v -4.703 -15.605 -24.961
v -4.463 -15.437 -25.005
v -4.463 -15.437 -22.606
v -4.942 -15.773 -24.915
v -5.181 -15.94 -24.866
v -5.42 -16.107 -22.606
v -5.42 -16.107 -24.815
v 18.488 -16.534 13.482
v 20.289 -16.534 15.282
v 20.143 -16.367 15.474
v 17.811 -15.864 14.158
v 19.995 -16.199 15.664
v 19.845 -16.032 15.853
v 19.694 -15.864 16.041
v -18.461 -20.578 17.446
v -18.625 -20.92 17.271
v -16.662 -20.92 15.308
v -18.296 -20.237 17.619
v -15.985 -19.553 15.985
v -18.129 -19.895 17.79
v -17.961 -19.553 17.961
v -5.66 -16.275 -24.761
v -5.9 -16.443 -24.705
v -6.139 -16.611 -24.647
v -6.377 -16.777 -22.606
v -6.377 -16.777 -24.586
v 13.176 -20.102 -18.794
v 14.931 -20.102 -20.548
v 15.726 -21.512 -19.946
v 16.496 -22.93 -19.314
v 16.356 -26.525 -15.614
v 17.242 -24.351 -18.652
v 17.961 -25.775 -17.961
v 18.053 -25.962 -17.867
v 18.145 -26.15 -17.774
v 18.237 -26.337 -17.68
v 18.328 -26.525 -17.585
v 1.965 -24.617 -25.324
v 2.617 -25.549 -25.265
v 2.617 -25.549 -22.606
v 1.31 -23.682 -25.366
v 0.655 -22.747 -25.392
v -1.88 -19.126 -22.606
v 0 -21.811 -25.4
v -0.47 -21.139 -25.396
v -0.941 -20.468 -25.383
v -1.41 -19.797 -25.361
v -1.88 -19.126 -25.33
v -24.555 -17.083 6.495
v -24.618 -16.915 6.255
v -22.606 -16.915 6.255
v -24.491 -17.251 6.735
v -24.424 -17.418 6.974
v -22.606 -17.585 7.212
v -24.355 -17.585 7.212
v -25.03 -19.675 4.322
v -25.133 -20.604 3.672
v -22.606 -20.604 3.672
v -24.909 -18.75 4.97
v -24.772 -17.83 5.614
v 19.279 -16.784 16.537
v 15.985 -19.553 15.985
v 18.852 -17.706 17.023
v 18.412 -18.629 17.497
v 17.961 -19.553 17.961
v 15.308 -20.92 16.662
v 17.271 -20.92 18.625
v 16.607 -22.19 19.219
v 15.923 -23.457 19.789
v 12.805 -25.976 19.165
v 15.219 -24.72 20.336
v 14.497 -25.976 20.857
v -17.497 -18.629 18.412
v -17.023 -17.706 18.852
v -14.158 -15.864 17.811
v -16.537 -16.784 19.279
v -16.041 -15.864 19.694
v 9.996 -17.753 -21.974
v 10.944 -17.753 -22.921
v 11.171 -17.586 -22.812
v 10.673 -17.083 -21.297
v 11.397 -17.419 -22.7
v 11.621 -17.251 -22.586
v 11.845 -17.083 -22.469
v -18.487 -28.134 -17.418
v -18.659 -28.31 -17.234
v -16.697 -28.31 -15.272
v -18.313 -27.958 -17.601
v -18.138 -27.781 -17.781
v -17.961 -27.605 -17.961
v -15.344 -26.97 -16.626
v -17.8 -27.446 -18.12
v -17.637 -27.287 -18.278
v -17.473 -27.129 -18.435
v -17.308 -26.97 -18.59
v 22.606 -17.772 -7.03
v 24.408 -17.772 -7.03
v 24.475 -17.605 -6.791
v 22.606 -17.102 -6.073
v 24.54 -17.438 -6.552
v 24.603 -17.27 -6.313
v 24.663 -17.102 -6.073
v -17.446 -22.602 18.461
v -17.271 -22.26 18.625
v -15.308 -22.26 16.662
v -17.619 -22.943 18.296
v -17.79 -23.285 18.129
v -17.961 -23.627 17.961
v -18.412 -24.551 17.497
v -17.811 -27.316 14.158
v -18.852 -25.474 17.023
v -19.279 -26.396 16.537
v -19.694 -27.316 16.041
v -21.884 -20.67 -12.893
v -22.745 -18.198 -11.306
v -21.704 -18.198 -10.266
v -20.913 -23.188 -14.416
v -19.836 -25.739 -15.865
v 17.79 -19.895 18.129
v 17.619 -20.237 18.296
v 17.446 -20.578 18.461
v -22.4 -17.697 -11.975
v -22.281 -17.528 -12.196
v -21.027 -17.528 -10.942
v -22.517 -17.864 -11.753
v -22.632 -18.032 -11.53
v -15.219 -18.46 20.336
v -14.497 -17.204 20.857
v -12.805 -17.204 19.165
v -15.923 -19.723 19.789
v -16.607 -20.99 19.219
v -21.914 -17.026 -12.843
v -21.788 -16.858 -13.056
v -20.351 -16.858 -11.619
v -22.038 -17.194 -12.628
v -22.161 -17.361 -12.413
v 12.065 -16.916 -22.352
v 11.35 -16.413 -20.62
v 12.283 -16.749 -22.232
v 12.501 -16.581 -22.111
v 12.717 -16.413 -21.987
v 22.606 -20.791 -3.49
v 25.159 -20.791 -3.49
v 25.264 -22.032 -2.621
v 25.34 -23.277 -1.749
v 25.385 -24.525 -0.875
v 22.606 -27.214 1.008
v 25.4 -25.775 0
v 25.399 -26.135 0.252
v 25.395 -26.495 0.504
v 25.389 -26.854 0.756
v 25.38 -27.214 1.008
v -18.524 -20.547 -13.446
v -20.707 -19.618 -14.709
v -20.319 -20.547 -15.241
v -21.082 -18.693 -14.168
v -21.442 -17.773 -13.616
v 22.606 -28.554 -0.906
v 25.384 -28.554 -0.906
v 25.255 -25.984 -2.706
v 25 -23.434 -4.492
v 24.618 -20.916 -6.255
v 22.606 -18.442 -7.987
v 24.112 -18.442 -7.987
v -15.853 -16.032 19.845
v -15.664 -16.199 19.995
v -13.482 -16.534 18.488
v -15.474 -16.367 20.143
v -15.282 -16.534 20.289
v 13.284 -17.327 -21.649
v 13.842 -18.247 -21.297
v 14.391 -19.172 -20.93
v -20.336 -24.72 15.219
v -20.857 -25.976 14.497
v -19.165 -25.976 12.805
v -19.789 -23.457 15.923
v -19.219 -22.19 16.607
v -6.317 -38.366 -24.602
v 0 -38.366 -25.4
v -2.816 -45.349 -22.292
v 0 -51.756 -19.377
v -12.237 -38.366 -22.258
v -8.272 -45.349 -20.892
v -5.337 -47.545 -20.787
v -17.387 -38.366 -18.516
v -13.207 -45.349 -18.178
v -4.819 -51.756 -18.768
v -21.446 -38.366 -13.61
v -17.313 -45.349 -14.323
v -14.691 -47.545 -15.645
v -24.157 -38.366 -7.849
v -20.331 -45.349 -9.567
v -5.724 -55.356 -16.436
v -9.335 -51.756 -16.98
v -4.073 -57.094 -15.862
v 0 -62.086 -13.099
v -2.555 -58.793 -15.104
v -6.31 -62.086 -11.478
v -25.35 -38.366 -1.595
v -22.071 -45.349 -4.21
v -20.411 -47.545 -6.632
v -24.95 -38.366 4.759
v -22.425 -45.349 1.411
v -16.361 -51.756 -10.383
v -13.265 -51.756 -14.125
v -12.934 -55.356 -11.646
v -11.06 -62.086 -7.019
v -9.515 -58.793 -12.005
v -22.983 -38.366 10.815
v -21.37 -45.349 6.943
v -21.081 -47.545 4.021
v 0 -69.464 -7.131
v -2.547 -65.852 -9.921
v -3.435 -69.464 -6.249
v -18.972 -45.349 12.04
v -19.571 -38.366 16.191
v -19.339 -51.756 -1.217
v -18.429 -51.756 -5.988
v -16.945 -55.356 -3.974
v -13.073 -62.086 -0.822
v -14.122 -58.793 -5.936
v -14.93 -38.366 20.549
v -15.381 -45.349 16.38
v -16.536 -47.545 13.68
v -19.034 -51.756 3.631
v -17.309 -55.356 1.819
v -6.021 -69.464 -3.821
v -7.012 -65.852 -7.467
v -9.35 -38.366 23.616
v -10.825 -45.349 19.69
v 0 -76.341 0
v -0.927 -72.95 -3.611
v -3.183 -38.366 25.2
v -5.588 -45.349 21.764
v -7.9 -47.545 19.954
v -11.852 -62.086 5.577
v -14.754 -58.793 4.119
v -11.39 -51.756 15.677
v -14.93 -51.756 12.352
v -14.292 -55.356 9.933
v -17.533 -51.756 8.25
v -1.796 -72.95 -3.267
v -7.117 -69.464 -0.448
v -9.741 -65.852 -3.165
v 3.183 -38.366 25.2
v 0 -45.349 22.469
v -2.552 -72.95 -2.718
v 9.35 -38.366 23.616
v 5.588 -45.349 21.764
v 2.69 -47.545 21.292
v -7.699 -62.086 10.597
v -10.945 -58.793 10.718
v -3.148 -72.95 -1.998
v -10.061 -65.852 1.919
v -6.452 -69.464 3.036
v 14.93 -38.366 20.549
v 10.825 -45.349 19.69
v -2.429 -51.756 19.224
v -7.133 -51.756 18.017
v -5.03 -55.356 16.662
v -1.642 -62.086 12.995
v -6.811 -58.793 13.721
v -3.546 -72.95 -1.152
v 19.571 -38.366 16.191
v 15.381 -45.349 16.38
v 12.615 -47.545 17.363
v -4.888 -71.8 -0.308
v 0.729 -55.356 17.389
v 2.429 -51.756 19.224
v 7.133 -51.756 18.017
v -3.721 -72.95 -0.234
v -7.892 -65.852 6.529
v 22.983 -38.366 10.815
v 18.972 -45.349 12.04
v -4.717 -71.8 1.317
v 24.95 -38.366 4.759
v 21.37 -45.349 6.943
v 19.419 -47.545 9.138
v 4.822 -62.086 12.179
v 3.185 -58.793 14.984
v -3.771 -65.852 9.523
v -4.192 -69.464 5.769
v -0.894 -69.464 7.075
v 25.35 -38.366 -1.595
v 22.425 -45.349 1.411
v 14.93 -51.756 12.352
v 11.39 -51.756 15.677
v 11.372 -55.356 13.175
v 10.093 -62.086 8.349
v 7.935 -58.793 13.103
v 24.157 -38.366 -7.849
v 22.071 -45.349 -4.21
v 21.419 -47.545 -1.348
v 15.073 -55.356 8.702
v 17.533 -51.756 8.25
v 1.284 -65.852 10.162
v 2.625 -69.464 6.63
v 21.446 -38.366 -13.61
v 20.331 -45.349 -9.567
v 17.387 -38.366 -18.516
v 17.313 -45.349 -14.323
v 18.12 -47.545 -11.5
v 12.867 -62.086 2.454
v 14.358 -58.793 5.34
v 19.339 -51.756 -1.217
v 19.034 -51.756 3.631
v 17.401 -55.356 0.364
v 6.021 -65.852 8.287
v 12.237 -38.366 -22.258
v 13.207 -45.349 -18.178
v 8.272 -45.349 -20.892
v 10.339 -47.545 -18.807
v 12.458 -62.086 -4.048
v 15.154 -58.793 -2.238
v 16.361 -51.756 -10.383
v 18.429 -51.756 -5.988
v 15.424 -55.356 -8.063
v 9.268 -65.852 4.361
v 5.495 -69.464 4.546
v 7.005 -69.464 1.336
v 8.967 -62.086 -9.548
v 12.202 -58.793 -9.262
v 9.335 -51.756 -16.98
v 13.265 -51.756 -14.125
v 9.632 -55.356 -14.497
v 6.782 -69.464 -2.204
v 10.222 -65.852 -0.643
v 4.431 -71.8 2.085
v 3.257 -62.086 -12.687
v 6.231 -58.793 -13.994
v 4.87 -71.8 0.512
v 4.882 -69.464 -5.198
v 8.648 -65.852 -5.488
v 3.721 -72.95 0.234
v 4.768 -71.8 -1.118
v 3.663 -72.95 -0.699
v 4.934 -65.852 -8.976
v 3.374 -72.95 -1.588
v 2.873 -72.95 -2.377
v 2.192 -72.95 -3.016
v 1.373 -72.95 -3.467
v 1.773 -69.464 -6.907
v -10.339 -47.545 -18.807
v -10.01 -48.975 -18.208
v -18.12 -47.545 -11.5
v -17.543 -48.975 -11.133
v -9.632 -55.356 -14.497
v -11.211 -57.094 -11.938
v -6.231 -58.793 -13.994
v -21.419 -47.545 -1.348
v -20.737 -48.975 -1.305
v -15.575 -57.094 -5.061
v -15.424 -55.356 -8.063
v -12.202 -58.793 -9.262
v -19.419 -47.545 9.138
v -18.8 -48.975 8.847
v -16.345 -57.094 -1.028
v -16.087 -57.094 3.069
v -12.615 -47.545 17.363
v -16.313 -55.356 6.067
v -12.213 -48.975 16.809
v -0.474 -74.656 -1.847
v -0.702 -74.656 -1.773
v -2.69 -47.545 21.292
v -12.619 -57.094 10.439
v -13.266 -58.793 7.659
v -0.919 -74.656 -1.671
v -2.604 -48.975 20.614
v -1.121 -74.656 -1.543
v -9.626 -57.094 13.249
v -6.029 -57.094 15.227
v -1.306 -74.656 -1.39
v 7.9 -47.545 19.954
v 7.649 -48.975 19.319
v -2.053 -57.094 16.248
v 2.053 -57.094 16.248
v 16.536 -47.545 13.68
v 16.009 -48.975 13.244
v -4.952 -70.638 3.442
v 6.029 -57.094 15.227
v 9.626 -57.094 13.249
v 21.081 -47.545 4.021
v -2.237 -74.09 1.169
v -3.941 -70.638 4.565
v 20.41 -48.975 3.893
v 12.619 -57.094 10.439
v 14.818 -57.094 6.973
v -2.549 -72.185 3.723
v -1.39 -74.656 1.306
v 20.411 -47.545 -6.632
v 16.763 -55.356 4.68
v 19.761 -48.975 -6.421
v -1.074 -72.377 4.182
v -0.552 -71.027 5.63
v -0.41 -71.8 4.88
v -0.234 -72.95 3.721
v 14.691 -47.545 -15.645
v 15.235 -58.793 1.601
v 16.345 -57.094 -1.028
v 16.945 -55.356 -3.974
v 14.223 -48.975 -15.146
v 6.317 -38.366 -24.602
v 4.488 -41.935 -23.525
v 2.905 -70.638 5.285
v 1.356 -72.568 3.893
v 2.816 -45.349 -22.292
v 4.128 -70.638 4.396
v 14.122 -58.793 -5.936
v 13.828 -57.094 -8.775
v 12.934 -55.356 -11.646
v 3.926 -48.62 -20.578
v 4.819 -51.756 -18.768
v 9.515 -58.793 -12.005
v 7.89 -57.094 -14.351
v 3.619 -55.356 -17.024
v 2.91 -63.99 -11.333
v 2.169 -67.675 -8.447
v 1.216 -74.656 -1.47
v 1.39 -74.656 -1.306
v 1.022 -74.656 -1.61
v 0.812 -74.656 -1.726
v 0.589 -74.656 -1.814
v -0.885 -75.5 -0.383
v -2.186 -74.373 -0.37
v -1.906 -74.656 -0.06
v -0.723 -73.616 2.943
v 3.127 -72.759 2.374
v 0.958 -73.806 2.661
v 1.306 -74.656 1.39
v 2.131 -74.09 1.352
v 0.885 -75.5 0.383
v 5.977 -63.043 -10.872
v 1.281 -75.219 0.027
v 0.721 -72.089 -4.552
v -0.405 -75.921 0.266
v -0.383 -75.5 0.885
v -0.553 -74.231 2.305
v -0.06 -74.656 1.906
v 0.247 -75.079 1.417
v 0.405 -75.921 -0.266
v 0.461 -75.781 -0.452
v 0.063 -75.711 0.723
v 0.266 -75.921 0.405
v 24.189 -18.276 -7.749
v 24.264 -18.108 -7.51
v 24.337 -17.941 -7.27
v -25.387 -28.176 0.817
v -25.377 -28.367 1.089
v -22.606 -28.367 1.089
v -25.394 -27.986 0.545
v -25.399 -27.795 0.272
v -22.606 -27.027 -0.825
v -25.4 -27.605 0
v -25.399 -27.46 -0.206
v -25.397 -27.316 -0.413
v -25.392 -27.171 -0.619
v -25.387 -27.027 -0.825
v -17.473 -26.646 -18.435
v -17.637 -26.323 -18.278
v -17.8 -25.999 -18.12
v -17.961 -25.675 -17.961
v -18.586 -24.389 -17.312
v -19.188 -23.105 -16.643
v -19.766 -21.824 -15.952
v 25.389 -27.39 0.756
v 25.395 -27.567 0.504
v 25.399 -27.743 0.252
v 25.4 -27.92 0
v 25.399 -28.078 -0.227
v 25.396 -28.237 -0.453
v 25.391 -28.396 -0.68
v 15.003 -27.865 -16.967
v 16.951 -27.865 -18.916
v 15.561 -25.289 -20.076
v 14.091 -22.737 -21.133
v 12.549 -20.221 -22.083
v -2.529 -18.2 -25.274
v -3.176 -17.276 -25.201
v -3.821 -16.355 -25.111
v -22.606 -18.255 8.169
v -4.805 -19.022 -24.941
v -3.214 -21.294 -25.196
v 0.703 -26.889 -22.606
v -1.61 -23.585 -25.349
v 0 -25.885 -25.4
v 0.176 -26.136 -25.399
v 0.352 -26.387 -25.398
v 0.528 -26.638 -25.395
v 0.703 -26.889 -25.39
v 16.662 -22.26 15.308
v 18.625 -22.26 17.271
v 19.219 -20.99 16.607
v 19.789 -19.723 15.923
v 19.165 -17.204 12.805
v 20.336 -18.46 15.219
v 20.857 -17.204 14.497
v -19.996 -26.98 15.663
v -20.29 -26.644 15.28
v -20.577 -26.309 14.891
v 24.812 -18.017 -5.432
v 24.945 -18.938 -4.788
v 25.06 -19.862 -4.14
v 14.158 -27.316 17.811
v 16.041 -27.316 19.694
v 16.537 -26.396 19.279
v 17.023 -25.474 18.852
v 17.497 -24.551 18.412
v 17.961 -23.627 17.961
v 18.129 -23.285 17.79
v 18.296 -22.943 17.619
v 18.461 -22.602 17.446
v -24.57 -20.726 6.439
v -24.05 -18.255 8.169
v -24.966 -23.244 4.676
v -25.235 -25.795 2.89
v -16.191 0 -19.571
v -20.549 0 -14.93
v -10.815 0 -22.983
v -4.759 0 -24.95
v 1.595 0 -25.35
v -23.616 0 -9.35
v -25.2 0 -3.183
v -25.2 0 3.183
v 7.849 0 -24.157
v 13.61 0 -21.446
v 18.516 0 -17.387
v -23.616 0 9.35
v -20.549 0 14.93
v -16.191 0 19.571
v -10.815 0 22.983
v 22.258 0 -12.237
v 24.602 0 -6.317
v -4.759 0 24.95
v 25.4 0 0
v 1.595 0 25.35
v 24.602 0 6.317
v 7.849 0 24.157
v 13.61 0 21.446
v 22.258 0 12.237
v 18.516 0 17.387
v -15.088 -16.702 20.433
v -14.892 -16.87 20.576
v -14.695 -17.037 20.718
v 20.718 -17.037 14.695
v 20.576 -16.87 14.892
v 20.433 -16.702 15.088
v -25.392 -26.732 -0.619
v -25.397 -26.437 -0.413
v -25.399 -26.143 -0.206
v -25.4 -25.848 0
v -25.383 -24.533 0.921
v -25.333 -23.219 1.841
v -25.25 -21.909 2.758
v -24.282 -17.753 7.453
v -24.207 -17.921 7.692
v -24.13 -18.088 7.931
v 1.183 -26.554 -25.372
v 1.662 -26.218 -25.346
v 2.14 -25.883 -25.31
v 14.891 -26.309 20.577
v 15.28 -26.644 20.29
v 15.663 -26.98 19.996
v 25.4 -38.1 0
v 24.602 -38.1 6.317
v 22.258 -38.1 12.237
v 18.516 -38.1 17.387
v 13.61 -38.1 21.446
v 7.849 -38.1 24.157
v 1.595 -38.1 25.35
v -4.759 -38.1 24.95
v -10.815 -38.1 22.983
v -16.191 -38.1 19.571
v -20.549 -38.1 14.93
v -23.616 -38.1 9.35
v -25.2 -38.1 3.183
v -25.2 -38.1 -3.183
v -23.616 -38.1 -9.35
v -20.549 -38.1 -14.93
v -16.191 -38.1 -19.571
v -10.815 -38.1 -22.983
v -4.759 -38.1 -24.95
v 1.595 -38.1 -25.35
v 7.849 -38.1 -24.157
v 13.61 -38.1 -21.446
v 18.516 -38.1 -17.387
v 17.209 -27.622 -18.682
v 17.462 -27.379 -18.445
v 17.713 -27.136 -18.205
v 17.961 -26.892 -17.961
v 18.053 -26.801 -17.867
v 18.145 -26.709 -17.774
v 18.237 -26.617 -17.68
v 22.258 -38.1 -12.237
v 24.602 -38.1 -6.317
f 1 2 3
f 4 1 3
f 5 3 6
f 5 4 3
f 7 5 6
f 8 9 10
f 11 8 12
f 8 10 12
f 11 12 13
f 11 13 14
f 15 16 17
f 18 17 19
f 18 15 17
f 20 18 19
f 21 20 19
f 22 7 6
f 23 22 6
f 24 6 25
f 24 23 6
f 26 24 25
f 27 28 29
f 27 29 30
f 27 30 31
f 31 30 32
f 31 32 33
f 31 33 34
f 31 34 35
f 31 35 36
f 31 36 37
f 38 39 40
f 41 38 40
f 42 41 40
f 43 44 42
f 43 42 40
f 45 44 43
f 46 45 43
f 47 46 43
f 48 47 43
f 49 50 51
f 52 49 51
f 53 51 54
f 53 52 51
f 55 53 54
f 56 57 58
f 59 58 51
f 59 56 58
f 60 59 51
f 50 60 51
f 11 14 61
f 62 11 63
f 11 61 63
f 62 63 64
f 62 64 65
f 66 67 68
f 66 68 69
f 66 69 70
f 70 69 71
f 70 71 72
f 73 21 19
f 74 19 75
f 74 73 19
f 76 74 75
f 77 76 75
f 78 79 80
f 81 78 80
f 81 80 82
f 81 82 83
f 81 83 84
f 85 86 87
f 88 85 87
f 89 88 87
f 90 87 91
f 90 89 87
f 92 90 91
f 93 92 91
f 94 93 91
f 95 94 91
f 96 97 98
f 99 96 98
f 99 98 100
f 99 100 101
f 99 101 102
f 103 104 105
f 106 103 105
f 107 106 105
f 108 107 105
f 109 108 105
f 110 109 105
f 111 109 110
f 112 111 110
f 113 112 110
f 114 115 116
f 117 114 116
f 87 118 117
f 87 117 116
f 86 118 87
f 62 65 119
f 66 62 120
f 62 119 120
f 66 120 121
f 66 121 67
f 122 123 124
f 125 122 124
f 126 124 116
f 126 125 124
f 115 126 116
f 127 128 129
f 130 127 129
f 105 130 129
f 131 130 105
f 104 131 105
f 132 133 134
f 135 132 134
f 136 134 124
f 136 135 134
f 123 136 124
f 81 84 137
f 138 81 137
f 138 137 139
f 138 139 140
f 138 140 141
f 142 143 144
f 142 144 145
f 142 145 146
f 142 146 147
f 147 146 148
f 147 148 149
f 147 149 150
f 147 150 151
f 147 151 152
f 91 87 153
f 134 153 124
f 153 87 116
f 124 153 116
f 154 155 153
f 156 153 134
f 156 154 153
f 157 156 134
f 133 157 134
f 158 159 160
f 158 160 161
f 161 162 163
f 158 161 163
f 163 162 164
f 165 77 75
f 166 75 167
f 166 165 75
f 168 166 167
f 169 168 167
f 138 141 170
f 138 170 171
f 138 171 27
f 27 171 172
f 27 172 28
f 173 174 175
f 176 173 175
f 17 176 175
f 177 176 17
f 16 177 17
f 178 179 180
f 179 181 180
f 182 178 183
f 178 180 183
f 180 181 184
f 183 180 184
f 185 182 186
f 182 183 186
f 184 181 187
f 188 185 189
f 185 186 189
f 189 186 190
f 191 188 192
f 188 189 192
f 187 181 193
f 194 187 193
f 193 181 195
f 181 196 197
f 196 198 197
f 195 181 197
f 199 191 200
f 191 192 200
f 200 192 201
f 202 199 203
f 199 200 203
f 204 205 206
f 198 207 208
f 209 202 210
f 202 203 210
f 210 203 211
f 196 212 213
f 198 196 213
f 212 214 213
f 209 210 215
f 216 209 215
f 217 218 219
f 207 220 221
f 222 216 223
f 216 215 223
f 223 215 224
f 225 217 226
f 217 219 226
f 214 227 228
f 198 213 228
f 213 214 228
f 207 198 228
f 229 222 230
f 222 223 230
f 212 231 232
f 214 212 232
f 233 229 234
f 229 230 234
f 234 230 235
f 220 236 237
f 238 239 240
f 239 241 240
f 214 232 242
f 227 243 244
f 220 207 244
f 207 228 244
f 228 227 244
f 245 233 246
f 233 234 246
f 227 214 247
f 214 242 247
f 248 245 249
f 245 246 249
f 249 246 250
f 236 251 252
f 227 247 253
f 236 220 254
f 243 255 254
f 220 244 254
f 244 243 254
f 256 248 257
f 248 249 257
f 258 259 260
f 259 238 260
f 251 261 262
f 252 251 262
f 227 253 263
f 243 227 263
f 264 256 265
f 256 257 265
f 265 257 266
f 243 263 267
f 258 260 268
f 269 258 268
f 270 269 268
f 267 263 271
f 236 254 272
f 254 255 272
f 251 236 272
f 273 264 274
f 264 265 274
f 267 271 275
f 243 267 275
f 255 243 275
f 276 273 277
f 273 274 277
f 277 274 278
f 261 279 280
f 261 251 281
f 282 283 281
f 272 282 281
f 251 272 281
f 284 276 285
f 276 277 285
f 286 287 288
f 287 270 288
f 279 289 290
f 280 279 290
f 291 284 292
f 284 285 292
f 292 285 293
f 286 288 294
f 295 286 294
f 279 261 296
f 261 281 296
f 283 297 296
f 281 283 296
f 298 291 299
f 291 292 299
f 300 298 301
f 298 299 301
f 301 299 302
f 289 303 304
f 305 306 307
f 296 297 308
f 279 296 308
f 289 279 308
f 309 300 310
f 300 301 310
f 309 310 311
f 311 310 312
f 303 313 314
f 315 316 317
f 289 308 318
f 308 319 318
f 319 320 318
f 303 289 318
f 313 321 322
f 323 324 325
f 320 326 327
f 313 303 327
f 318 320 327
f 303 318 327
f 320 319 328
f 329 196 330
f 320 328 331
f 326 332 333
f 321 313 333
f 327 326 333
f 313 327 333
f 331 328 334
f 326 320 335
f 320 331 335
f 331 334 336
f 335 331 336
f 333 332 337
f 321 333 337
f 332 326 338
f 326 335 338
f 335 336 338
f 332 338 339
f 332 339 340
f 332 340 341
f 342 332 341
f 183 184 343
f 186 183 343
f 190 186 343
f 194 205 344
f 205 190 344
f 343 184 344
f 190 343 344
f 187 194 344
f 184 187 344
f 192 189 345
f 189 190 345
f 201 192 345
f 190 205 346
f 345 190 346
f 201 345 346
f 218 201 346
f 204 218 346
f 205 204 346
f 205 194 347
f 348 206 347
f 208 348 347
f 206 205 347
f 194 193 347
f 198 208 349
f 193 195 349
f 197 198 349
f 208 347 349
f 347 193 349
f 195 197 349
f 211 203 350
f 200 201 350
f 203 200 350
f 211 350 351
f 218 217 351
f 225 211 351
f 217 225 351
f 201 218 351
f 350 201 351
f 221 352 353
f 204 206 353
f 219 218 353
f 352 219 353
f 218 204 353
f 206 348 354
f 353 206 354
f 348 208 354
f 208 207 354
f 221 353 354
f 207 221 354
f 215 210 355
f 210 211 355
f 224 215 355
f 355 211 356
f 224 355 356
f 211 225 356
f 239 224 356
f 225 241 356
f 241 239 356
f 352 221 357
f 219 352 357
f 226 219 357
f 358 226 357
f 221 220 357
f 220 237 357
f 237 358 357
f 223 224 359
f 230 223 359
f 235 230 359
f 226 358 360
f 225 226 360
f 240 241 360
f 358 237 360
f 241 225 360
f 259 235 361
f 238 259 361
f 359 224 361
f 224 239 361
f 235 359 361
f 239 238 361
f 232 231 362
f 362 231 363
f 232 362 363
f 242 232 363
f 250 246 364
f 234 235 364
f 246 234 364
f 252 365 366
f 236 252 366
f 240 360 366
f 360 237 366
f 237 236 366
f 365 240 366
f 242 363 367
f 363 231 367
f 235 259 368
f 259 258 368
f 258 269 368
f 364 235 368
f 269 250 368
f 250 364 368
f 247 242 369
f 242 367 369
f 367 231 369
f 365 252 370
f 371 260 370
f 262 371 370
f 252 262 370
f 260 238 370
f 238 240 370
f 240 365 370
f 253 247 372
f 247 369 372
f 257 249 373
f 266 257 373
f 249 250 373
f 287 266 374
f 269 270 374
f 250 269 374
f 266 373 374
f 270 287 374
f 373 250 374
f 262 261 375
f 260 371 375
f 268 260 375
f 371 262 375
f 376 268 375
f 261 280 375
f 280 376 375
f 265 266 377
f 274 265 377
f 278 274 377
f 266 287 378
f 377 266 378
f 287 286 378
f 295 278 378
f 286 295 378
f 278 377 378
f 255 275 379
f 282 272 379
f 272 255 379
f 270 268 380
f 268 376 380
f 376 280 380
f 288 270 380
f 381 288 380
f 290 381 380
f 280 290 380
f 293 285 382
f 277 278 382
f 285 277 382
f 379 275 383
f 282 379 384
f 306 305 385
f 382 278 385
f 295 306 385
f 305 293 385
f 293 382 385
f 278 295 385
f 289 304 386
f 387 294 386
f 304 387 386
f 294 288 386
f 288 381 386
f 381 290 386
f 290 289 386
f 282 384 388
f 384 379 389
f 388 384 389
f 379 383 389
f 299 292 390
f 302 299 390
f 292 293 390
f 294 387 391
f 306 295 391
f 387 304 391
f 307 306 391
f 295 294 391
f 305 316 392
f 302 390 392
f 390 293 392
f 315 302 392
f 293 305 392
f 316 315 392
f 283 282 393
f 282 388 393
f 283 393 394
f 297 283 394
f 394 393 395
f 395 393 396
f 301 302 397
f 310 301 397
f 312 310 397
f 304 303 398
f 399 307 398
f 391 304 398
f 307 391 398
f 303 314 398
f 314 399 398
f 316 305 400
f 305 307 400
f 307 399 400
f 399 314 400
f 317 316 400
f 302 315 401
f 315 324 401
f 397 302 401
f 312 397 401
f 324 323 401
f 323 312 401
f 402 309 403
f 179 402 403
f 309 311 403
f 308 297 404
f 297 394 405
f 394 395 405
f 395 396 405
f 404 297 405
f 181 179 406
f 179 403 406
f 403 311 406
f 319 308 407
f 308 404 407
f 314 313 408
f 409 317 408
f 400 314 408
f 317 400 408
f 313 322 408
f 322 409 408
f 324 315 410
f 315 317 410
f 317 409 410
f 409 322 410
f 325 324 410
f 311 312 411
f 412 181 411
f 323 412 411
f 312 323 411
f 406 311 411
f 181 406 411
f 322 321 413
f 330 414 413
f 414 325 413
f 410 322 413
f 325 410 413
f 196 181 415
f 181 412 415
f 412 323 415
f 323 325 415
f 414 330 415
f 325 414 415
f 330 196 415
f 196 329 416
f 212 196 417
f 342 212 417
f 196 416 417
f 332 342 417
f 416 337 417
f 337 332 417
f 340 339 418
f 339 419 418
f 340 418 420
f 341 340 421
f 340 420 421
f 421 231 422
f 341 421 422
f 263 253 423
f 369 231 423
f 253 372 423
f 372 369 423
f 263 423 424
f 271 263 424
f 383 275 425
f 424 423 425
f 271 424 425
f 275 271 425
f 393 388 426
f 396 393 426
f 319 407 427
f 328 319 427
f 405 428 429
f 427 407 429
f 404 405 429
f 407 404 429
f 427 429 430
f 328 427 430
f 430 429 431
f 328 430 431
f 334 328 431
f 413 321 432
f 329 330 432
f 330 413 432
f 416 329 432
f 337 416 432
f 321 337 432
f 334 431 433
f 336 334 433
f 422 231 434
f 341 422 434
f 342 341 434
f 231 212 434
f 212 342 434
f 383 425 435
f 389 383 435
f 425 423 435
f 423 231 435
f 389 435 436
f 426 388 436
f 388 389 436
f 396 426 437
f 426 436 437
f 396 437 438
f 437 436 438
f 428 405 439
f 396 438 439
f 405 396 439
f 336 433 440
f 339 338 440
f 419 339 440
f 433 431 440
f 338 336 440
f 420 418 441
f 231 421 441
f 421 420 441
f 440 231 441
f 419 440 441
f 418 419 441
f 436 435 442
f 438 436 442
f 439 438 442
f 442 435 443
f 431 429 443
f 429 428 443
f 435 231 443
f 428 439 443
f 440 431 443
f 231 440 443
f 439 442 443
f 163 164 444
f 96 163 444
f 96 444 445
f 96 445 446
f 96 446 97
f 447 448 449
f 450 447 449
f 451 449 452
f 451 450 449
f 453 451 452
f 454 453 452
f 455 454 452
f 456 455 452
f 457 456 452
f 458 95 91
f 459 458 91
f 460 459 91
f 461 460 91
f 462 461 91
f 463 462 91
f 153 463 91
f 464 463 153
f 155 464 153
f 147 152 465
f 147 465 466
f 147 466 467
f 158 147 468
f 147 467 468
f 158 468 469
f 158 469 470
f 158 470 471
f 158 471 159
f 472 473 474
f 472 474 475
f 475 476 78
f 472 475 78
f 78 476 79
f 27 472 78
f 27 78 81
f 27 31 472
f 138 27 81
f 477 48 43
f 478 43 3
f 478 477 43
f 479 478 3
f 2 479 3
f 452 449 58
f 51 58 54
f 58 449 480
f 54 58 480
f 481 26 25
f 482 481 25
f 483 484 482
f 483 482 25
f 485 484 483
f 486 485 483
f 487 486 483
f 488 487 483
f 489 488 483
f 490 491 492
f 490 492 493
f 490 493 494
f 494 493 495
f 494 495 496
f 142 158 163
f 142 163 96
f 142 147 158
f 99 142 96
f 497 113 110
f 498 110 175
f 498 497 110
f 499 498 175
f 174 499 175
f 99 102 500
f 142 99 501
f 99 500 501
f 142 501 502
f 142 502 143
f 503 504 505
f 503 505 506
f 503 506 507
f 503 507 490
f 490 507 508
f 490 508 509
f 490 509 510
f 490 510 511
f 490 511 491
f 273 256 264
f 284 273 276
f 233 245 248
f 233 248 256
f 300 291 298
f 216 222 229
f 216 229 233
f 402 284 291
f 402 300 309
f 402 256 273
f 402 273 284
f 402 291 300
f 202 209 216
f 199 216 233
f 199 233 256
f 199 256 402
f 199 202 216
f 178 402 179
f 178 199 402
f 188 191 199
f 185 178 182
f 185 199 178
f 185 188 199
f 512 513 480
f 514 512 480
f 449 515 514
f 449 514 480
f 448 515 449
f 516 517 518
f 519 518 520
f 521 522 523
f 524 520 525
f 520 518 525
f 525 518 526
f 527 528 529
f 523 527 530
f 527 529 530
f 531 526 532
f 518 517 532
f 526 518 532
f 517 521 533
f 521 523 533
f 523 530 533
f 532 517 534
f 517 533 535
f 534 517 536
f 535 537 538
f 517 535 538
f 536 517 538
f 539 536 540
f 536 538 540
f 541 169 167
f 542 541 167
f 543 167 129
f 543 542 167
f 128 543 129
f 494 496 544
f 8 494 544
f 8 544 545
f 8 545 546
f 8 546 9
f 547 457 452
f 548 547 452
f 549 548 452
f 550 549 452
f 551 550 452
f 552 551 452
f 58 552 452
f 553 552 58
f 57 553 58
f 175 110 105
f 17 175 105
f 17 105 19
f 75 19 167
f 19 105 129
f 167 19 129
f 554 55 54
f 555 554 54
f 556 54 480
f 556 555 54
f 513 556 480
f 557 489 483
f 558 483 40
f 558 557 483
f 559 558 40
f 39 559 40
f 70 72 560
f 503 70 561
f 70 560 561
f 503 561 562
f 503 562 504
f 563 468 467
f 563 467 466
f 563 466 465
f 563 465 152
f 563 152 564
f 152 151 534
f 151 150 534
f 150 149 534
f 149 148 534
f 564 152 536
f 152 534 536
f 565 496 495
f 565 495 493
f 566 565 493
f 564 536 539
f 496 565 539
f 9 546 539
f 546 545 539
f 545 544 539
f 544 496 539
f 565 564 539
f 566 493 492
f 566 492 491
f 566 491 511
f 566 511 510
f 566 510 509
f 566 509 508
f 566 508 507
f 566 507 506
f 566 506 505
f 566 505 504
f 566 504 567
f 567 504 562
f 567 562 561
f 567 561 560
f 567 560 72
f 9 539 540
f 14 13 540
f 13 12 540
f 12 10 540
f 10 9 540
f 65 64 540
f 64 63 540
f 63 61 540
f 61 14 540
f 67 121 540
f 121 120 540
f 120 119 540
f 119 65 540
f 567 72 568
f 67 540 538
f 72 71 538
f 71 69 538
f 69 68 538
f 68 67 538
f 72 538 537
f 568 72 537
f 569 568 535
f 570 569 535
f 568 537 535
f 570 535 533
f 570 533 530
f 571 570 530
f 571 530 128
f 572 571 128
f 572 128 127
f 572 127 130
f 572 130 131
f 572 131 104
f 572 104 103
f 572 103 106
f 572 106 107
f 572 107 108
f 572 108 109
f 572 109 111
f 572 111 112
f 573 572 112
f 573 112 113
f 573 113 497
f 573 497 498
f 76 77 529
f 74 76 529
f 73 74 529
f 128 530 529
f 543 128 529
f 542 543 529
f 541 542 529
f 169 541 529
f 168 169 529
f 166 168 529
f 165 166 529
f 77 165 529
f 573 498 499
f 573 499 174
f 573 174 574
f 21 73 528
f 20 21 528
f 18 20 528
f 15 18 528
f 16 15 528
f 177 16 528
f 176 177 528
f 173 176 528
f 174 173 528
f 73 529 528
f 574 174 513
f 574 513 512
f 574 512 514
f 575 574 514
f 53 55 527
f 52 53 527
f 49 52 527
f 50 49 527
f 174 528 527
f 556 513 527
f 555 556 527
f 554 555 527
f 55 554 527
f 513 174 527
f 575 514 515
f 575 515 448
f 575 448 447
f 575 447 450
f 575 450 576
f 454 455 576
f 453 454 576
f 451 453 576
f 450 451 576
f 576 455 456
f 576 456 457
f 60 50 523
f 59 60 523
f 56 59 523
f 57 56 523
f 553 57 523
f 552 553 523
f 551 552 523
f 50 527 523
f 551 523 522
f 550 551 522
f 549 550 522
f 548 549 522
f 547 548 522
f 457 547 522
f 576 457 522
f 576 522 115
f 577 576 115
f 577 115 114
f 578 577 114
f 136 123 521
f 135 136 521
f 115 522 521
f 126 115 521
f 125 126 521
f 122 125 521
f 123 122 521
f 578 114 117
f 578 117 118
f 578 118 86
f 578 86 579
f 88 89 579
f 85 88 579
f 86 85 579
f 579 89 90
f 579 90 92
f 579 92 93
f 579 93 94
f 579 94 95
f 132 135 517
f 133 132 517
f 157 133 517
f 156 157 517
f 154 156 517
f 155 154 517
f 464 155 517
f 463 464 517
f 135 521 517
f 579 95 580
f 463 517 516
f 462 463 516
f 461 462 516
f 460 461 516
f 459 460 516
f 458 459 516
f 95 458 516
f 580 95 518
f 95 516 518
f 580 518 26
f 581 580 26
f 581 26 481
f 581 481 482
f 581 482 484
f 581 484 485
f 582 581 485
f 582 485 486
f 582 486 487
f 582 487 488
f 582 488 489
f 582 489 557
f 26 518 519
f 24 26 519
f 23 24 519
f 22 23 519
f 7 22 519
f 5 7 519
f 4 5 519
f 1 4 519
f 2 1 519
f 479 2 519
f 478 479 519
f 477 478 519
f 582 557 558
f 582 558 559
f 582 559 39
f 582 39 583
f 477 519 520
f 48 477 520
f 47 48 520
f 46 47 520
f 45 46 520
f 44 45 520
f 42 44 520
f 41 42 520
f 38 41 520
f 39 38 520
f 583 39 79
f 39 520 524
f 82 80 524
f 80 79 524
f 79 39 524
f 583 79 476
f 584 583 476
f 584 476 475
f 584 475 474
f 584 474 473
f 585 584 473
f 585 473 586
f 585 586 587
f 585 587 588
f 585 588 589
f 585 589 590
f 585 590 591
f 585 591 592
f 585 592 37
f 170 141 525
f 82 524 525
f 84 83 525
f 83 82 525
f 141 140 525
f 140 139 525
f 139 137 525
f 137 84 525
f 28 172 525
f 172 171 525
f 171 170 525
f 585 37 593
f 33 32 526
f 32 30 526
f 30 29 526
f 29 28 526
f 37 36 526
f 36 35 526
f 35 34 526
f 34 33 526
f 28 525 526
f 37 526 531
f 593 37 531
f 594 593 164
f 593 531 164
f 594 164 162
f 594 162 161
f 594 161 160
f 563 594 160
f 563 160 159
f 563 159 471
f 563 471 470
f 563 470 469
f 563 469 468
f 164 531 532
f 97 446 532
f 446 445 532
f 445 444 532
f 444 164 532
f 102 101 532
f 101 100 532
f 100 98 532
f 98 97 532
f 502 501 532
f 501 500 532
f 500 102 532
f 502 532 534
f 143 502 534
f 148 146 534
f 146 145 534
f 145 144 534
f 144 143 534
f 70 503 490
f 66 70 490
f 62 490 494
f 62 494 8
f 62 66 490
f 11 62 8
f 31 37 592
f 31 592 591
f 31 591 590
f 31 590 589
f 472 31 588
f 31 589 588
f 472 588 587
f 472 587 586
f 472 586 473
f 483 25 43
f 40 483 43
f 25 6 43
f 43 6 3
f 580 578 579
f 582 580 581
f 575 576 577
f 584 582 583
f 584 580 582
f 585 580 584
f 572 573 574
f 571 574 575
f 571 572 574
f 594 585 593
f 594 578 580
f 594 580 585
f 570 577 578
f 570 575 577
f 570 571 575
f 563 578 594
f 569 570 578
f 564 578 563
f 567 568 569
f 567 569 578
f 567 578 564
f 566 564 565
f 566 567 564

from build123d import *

# Parameters (mm, degrees)
F0_R      = 25.4
F1_DEPTH  = 38.1
F21_DEPTH = 2.794
F22_DEPTH = 2.794
F23_DEPTH = 2.794
F24_DEPTH = 2.794
F25_DEPTH = 2.794
F26_DEPTH = 2.794
F27_DEPTH = 2.794


with BuildPart() as f1:
    # F0 (on Front) → F1 (new body)
    with BuildSketch(Plane.XZ):
        Circle(F0_R)
    extrude(amount=F1_DEPTH)

    # F14 (on face) → F21 (cut)
    with BuildSketch(Plane(origin=(17.9605122421, 0, 17.9605122421), x_dir=(0, 1, 0), z_dir=(0.7071067812, 0, 0.7071067812))):
        Polygon((-22.2601667082, -0.9570972485), (-17.2041964605, -4.497325729), (-16.5340297522, -3.5402284804), (-21.59, 0), align=None)
        Polygon((-27.316136956, 2.5831312319), (-22.2601667082, -0.9570972485), (-21.59, 0), (-20.9198332918, 0.9570972485), (-25.9758035395, 4.497325729), align=None)
        Polygon((-21.59, 0), (-16.5340297522, -3.5402284804), (-15.863863044, -2.5831312319), (-19.552956764, 0), align=None)
        Polygon((-20.9198332918, 0.9570972485), (-21.59, 0), (-19.552956764, 0), align=None)
    extrude(amount=-F21_DEPTH, mode=Mode.SUBTRACT)

    # F20 (on offset) → F22 (cut)
    with BuildSketch(Plane.YZ.offset(25.4)):
        Polygon((-28.5544317948, -0.9064046195), (-18.4424912993, -7.9868615804), (-17.772324591, -7.0297643319), (-22.8282948388, -3.4895358514), (-21.4186995436, -3.4895358514), (-20.7912516028, -3.4895358514), (-27.2140983783, 1.0077898775), align=None)
        Polygon((-22.8282948388, -3.4895358514), (-17.772324591, -7.0297643319), (-17.1021578828, -6.0726670833), (-20.7912516028, -3.4895358514), (-21.4186995436, -3.4895358514), align=None)
    extrude(amount=-F22_DEPTH, mode=Mode.SUBTRACT)

    # F19 (on face) → F23 (cut)
    with BuildSketch(Plane(origin=(17.9605122421, 0, -17.9605122421), x_dir=(0, 1, 0), z_dir=(0.7071067812, 0, -0.7071067812))):
        Polygon((-27.8651035773, -1.3890774337), (-17.7531630818, -8.4695343946), (-17.0829963736, -7.5124371461), (-22.1389666213, -3.9722086656), (-20.1019233853, -3.9722086656), (-26.5247701609, 0.5251170634), align=None)
        Polygon((-22.1389666213, -3.9722086656), (-17.0829963736, -7.5124371461), (-16.4128296653, -6.5553398975), (-20.1019233853, -3.9722086656), align=None)
    extrude(amount=-F23_DEPTH, mode=Mode.SUBTRACT)

    # F18 (on offset) → F24 (cut)
    with BuildSketch(Plane.XY.offset(-25.4)):
        Polygon((-6.3771515661, -16.7774689451), (0.7033053948, -26.8894094406), (2.6174998919, -25.5490760241), (-1.8798258371, -19.1262292486), (-1.8798258371, -21.1632724846), (-5.4200543175, -16.1073022368), align=None)
        Polygon((-4.462957069, -15.4371355286), (-5.4200543175, -16.1073022368), (-1.8798258371, -21.1632724846), (-1.8798258371, -19.1262292486), align=None)
    extrude(amount=F24_DEPTH, mode=Mode.SUBTRACT)

    # F17 (on face) → F25 (cut)
    with BuildSketch(Plane(origin=(-17.9605122421, 0, -17.9605122421), x_dir=(0, 1, 0), z_dir=(0.7071067812, 0, 0.7071067812))):
        Polygon((-20.5471214297, 3.5909211094), (-16.8580277097, 6.1740523413), (-17.5281944179, 7.1311495899), (-22.5841646657, 3.5909211094), align=None)
        Polygon((-26.9699682052, -0.9064046195), (-20.5471214297, 3.5909211094), (-22.5841646657, 3.5909211094), (-17.5281944179, 7.1311495899), (-18.1983611261, 8.0882468384), (-28.3103016217, 1.0077898775), align=None)
    extrude(amount=F25_DEPTH, mode=Mode.SUBTRACT)

    # F16 (on offset) → F26 (cut)
    with BuildSketch(Plane.YZ.offset(-25.4)):
        Polygon((-20.6038281526, 3.6719067028), (-16.9147344326, 6.2550379347), (-17.5849011408, 7.2121351832), (-22.6408713886, 3.6719067028), align=None)
        Polygon((-27.0266749281, -0.8254190262), (-20.6038281526, 3.6719067028), (-22.6408713886, 3.6719067028), (-17.5849011408, 7.2121351832), (-18.2550678491, 8.1692324318), (-28.3670083446, 1.0887754709), align=None)
    extrude(amount=F26_DEPTH, mode=Mode.SUBTRACT)

    # F15 (on face) → F27 (cut)
    with BuildSketch(Plane(origin=(-17.9605122421, 0, 17.9605122421), x_dir=(0, 1, 0), z_dir=(0.7071067812, 0, -0.7071067812))):
        Polygon((-21.59, 0), (-20.9198332918, -0.9570972485), (-19.552956764, 0), align=None)
        Polygon((-25.9758035395, -4.497325729), (-20.9198332918, -0.9570972485), (-21.59, 0), (-22.2601667082, 0.9570972485), (-27.316136956, -2.5831312319), align=None)
        Polygon((-21.59, 0), (-19.552956764, 0), (-15.863863044, 2.5831312319), (-16.5340297522, 3.5402284804), align=None)
        Polygon((-22.2601667082, 0.9570972485), (-21.59, 0), (-16.5340297522, 3.5402284804), (-17.2041964605, 4.497325729), align=None)
    extrude(amount=F27_DEPTH, mode=Mode.SUBTRACT)


with BuildPart() as f3:
    # F2 (on Right) → F3 (revolve)
    with BuildSketch(Plane.YZ):
        with BuildLine():
            Line((-38.3663102984, 0), (-76.3406405559, 0))
            add(Edge.make_bspline(
                [(-38.3663102984, -25.4), (-54.5826740563, -18.9965814352), (-65.9471228719, -12.1034290642), (-76.3406405559, 0)],
                knots=[0, 0, 0, 0, 45.6859908342, 45.6859908342, 45.6859908342, 45.6859908342], degree=3))
            Line((-38.3663102984, -25.4), (-38.3663102984, 0))
        make_face()
    revolve(axis=Axis((0, -57.3534754272, 0), (0, 1, 0)))


solid = Compound([f1.part, f3.part])
